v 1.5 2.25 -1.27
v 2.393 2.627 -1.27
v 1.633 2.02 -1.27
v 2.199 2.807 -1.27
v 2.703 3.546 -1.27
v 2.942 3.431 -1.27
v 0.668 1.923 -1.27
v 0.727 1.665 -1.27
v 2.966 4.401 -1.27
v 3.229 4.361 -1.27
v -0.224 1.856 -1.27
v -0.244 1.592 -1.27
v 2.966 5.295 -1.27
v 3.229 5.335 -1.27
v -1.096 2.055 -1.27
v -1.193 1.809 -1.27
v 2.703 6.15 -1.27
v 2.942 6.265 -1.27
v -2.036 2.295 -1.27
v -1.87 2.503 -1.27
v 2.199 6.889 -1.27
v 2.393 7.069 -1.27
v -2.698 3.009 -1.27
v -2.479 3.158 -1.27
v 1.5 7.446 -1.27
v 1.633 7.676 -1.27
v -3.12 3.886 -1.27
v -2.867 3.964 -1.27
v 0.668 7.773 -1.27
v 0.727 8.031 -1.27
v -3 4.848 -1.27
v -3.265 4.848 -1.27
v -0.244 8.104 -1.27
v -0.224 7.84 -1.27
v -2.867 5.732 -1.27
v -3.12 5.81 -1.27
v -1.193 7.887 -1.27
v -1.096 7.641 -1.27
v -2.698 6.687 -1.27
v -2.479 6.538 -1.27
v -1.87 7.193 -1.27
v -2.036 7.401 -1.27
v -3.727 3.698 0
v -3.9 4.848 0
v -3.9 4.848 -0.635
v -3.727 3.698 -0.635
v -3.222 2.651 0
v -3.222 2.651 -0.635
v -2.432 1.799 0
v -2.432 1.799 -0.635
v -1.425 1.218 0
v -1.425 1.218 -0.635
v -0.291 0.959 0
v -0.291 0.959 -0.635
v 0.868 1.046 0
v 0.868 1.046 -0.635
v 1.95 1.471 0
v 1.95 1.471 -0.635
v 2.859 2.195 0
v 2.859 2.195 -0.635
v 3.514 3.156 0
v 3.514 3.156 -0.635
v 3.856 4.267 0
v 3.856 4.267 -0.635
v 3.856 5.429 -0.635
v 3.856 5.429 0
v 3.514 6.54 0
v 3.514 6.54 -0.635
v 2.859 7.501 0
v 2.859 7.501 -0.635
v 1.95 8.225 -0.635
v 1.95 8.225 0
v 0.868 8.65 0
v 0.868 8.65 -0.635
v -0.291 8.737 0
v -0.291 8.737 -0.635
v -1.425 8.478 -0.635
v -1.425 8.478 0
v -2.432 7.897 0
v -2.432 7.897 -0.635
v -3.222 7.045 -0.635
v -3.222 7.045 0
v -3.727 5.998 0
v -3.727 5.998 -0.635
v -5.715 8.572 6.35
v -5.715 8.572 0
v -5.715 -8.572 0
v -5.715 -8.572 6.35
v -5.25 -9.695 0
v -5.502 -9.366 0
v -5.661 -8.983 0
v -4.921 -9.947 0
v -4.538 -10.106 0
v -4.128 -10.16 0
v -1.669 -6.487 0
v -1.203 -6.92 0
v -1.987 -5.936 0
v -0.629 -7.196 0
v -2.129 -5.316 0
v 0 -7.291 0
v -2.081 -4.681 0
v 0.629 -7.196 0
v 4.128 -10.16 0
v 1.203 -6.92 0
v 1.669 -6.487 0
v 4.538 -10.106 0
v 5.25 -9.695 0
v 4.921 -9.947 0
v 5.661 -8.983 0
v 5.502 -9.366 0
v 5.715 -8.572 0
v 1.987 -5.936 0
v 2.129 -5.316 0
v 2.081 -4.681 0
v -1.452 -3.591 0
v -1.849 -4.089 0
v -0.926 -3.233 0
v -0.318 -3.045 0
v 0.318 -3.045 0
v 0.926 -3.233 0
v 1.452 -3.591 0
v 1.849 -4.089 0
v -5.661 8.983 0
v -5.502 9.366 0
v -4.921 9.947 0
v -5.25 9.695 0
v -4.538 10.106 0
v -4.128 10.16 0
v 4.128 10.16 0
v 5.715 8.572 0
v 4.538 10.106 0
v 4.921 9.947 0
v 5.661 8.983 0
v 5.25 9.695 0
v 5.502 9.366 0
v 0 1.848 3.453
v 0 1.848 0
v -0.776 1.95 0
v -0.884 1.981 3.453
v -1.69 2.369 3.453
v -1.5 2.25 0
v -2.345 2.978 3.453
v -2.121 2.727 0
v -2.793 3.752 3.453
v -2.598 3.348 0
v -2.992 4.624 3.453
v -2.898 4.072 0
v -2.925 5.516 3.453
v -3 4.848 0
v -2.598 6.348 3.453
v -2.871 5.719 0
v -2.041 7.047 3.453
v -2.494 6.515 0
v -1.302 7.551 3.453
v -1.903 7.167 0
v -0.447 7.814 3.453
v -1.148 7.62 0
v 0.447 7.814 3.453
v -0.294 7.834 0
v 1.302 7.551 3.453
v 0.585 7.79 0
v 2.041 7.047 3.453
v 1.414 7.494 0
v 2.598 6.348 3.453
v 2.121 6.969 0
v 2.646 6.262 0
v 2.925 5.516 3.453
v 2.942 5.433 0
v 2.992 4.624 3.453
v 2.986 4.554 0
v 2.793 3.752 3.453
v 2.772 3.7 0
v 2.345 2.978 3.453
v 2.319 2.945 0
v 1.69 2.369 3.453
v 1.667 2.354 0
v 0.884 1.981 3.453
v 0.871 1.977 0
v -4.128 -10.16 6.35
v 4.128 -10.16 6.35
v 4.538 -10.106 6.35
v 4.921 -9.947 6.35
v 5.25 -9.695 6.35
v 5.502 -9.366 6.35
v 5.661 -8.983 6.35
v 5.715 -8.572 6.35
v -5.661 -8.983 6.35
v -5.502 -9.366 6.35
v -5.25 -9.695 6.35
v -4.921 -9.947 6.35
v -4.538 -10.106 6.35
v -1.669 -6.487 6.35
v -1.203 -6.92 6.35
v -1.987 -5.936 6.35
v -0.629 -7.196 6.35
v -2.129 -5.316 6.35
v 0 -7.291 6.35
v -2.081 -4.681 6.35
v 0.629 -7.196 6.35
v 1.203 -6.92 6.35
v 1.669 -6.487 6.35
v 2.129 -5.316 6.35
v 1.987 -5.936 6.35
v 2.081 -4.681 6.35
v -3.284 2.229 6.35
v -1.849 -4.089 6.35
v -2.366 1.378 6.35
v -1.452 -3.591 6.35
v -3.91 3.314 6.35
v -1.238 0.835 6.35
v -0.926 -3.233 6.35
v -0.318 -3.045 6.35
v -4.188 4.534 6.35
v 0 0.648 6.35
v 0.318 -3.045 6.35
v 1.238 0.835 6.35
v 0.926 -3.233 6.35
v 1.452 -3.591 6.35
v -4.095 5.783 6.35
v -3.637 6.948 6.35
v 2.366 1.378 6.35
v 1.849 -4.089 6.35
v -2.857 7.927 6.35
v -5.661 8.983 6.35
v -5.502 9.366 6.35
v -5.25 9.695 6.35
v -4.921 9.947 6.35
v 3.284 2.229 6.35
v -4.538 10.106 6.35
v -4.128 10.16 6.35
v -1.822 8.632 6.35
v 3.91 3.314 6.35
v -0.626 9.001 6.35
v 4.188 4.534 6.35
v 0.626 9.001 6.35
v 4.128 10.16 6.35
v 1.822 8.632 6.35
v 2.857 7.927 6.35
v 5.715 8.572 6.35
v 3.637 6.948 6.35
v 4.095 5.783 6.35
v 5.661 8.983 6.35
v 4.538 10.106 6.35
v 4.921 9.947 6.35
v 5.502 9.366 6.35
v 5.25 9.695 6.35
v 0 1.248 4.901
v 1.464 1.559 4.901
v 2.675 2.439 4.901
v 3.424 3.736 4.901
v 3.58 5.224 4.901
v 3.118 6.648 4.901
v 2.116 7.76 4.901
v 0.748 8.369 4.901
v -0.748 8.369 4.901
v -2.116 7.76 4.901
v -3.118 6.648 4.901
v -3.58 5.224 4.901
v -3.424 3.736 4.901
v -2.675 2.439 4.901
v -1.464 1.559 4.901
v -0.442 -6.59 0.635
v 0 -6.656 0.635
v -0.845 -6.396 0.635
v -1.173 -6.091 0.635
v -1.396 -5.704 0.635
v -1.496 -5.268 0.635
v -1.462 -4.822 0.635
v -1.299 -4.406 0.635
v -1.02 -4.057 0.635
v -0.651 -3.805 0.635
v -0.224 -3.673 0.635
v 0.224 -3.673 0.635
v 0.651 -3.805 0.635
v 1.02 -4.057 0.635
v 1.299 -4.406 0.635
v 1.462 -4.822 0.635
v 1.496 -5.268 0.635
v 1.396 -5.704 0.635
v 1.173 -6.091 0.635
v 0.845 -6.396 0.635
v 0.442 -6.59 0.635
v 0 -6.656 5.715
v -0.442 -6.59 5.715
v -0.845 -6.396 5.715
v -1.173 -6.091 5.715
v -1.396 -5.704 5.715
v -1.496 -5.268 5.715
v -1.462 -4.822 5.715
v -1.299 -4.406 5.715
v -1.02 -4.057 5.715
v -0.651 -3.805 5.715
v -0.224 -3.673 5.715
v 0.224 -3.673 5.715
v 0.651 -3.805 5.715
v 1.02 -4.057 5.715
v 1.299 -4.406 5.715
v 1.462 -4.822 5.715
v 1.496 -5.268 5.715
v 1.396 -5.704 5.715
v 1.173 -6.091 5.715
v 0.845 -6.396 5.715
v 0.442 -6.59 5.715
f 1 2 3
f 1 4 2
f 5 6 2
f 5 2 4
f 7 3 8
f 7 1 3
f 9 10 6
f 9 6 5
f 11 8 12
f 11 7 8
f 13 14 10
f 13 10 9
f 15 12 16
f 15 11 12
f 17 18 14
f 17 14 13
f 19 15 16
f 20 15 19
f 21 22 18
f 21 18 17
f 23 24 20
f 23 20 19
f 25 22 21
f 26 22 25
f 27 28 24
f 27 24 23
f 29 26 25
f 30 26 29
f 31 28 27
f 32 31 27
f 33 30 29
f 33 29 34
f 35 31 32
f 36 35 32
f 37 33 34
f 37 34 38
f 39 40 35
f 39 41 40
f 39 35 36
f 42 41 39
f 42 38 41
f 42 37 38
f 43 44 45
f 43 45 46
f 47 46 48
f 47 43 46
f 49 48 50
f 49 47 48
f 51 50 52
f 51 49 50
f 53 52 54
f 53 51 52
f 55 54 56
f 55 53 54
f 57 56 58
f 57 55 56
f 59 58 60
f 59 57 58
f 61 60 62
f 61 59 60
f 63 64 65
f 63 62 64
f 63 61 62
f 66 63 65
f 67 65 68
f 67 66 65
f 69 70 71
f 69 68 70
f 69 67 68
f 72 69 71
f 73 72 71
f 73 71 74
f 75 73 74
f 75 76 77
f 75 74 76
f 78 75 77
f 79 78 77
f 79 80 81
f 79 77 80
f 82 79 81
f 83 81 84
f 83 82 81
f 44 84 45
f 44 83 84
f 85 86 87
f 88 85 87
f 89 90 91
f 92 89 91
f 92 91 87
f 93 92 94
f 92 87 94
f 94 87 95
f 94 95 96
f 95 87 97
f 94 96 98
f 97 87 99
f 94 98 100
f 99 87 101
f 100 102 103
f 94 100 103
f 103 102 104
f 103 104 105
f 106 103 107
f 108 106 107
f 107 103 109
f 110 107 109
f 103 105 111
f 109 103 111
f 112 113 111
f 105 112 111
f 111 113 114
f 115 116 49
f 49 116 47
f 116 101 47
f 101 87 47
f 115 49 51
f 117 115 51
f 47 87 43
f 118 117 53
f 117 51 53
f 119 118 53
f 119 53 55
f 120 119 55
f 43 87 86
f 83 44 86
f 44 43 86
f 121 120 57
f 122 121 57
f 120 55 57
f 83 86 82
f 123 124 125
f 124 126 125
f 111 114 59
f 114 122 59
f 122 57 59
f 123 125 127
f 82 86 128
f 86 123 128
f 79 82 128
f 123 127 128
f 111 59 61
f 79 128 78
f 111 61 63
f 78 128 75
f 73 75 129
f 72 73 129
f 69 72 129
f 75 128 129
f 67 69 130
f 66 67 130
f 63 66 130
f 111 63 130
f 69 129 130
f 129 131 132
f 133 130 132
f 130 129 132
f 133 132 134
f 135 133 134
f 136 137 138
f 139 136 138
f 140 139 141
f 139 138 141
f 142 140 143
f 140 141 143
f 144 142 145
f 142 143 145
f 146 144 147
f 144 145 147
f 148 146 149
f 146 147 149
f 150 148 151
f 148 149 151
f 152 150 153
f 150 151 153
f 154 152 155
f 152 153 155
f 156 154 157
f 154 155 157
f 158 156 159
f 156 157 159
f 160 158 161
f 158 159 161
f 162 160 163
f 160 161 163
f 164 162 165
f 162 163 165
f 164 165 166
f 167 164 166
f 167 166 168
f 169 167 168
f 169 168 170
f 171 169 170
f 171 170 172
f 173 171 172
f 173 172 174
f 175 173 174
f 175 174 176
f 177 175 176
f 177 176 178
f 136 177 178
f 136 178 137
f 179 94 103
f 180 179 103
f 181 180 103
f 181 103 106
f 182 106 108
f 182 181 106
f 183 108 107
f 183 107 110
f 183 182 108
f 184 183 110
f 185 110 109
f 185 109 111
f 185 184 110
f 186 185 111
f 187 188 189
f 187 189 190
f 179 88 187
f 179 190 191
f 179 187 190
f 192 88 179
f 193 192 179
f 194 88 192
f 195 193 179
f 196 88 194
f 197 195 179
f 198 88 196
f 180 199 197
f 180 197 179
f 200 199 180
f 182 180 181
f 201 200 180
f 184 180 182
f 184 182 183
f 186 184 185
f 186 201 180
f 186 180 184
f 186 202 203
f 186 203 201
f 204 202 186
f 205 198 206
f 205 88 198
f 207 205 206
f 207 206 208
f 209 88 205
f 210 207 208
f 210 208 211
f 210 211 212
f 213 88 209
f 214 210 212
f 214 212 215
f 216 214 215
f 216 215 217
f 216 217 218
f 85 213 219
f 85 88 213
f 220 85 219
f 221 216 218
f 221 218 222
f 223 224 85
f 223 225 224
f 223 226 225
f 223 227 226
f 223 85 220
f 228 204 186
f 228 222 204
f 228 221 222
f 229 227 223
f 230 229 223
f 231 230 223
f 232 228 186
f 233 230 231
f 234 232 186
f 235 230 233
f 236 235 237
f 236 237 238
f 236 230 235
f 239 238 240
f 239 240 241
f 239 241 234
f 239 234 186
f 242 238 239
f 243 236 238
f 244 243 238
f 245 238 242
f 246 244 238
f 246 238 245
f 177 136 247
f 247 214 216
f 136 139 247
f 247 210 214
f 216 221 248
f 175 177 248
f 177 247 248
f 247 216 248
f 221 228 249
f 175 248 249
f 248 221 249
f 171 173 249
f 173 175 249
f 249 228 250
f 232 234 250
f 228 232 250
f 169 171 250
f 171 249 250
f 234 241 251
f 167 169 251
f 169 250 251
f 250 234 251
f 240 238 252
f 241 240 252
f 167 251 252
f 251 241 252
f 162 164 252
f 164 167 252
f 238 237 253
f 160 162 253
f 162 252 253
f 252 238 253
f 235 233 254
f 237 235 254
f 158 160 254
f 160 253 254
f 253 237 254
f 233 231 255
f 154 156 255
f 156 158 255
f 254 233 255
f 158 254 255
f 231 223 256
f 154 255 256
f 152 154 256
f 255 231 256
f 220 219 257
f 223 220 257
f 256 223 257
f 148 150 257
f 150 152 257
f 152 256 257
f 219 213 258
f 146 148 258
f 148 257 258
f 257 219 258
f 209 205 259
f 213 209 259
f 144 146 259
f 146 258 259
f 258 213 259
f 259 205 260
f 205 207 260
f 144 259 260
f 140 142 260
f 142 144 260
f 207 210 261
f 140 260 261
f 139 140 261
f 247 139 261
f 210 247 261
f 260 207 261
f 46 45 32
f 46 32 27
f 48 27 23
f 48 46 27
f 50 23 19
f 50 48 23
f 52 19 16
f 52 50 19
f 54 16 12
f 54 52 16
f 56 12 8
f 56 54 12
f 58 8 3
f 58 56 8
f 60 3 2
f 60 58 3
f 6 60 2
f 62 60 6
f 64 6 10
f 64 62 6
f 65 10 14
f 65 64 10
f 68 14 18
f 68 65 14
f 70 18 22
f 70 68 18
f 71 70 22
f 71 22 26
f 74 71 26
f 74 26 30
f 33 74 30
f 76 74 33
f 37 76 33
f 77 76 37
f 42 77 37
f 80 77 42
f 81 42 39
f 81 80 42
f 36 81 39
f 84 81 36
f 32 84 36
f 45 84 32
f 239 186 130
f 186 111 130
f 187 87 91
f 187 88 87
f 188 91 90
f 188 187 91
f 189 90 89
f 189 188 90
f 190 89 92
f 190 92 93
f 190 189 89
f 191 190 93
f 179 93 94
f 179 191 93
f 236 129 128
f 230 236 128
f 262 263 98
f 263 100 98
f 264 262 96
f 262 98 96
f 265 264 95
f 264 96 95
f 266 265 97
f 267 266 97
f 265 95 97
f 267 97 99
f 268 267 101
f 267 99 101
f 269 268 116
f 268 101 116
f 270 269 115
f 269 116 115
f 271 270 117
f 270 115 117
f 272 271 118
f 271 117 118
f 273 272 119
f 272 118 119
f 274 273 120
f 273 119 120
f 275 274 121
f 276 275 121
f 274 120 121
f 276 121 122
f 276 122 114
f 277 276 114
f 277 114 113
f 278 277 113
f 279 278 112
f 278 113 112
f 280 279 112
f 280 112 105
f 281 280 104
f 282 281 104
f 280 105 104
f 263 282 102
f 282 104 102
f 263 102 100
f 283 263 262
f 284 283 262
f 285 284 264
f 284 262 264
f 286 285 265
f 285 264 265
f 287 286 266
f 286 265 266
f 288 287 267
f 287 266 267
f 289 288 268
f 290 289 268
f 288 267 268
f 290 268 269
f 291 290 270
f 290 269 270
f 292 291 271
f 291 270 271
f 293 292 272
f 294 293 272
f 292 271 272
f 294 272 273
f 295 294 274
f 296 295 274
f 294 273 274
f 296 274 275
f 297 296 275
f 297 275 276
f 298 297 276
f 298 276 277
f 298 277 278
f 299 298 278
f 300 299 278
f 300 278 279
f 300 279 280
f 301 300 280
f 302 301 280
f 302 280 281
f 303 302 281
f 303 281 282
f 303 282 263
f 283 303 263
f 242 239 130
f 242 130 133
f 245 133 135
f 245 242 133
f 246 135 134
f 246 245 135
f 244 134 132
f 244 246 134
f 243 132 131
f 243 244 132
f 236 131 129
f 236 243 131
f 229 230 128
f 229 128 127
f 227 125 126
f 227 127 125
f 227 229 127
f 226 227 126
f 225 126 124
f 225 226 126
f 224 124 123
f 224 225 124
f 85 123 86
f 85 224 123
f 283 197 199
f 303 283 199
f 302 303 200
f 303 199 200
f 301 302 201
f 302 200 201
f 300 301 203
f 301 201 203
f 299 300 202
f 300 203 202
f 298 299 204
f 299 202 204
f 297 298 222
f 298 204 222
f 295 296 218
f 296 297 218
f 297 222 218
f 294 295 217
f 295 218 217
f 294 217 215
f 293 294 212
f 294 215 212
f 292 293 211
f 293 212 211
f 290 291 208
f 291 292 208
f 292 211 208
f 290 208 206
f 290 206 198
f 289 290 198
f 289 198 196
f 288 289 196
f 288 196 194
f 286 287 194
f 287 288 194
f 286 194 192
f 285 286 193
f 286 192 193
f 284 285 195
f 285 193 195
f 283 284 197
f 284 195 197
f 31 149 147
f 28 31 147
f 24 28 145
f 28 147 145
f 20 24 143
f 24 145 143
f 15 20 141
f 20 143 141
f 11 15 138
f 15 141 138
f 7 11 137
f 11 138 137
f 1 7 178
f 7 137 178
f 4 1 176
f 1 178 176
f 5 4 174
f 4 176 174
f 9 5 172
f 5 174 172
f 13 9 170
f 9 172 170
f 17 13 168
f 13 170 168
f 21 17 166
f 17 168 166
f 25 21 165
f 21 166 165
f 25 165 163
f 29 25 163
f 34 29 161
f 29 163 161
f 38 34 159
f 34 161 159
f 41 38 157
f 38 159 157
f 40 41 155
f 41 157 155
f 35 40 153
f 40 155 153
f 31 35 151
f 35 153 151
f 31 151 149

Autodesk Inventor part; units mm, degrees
ref_plane "YZ Plane" through (0, 0, 0) normal (1, 0, 0) x (0, 1, 0)
ref_plane "XZ Plane" through (0, 0, 0) normal (0, 1, 0) x (-1, 0, 0)
ref_plane "XY Plane" through (0, 0, 0) normal (0, 0, 1) x (1, 0, 0)
sketch "Sketch1" plane through (0, 0, 0) normal (0, 0, 1) x (1, 0, 0)
  line L0 (-5.715, -10.16) -> (5.715, -10.16)
  line L1 (5.715, -10.16) -> (5.715, 10.16)
  line L2 (5.715, 10.16) -> (-5.715, 10.16)
  line L3 (-5.715, 10.16) -> (-5.715, -10.16)
  line L4 (-5.715, -10.16) -> (5.715, 10.16) construction
  line L5 (5.715, -10.16) -> (-5.715, 10.16) construction
  point P0 (0, 0)
  dimension "d0" = 20.32
  dimension "d1" = 11.43
extrude "Extrusion1" add sketch "Sketch1" along normal blind 6.35
sketch "Sketch2" plane through (0, 0, 6.35) normal (0, 0, 1) x (1, 0, 0)
  line L0 (-5.715, 10.16) -> (-5.715, -10.16) projected
  line L1 (-5.715, -10.16) -> (5.715, -10.16) projected
  point P0 (0, 0)
  point P1 (0, -5.1562)
  dimension "d5" = 5.0038
  dimension "d22" = 5.715
hole "Hole1" at (0, -5.1562, 6.35) direction (0, 0, -1) diameter 3 end through all
sketch "Sketch3" plane through (0, 0, 6.35) normal (0, 0, 1) x (1, 0, 0)
  line L0 (-5.715, -10.16) -> (5.715, -10.16) projected
  line L1 (5.715, -10.16) -> (5.715, 10.16) projected
  point P0 (0, 0)
  point P1 (0, 4.848)
  dimension "d13" = 15.008
  dimension "d14" = 5.715
hole "Hole2" at (0, 4.848, 6.35) direction (0, 0, -1) diameter 6 end through all countersink diameter 8.4 countersink angle 45
fillet "Fillet1" radius 1.5875 4 edges at (5.715, 10.16, 3.175) (-5.715, 10.16, 3.175) (5.715, -10.16, 3.175) (-5.715, -10.16, 3.175)
sketch "Sketch4" plane through (0, 0, 0) normal (0, 0, -1) x (-1, 0, 0)
  circle A0 centre (0, 4.848) radius 3 projected
  circle A1 centre (0, 4.848) radius 3.9
  circle A2 centre (0, 4.848) radius 3 construction
  point P0 (0, 0)
  dimension "d27" = 7.8
extrude "Extrusion2" add sketch "Sketch4" along normal blind 1.27
chamfer "Chamfer2" distance 0.635 angle 45 3 edges at (0, -3.6562, 0) (0, -3.6562, 6.35) (3.9, 4.848, -1.27)
properties part number "beam_break_spacer" material "Aluminum 6061"
